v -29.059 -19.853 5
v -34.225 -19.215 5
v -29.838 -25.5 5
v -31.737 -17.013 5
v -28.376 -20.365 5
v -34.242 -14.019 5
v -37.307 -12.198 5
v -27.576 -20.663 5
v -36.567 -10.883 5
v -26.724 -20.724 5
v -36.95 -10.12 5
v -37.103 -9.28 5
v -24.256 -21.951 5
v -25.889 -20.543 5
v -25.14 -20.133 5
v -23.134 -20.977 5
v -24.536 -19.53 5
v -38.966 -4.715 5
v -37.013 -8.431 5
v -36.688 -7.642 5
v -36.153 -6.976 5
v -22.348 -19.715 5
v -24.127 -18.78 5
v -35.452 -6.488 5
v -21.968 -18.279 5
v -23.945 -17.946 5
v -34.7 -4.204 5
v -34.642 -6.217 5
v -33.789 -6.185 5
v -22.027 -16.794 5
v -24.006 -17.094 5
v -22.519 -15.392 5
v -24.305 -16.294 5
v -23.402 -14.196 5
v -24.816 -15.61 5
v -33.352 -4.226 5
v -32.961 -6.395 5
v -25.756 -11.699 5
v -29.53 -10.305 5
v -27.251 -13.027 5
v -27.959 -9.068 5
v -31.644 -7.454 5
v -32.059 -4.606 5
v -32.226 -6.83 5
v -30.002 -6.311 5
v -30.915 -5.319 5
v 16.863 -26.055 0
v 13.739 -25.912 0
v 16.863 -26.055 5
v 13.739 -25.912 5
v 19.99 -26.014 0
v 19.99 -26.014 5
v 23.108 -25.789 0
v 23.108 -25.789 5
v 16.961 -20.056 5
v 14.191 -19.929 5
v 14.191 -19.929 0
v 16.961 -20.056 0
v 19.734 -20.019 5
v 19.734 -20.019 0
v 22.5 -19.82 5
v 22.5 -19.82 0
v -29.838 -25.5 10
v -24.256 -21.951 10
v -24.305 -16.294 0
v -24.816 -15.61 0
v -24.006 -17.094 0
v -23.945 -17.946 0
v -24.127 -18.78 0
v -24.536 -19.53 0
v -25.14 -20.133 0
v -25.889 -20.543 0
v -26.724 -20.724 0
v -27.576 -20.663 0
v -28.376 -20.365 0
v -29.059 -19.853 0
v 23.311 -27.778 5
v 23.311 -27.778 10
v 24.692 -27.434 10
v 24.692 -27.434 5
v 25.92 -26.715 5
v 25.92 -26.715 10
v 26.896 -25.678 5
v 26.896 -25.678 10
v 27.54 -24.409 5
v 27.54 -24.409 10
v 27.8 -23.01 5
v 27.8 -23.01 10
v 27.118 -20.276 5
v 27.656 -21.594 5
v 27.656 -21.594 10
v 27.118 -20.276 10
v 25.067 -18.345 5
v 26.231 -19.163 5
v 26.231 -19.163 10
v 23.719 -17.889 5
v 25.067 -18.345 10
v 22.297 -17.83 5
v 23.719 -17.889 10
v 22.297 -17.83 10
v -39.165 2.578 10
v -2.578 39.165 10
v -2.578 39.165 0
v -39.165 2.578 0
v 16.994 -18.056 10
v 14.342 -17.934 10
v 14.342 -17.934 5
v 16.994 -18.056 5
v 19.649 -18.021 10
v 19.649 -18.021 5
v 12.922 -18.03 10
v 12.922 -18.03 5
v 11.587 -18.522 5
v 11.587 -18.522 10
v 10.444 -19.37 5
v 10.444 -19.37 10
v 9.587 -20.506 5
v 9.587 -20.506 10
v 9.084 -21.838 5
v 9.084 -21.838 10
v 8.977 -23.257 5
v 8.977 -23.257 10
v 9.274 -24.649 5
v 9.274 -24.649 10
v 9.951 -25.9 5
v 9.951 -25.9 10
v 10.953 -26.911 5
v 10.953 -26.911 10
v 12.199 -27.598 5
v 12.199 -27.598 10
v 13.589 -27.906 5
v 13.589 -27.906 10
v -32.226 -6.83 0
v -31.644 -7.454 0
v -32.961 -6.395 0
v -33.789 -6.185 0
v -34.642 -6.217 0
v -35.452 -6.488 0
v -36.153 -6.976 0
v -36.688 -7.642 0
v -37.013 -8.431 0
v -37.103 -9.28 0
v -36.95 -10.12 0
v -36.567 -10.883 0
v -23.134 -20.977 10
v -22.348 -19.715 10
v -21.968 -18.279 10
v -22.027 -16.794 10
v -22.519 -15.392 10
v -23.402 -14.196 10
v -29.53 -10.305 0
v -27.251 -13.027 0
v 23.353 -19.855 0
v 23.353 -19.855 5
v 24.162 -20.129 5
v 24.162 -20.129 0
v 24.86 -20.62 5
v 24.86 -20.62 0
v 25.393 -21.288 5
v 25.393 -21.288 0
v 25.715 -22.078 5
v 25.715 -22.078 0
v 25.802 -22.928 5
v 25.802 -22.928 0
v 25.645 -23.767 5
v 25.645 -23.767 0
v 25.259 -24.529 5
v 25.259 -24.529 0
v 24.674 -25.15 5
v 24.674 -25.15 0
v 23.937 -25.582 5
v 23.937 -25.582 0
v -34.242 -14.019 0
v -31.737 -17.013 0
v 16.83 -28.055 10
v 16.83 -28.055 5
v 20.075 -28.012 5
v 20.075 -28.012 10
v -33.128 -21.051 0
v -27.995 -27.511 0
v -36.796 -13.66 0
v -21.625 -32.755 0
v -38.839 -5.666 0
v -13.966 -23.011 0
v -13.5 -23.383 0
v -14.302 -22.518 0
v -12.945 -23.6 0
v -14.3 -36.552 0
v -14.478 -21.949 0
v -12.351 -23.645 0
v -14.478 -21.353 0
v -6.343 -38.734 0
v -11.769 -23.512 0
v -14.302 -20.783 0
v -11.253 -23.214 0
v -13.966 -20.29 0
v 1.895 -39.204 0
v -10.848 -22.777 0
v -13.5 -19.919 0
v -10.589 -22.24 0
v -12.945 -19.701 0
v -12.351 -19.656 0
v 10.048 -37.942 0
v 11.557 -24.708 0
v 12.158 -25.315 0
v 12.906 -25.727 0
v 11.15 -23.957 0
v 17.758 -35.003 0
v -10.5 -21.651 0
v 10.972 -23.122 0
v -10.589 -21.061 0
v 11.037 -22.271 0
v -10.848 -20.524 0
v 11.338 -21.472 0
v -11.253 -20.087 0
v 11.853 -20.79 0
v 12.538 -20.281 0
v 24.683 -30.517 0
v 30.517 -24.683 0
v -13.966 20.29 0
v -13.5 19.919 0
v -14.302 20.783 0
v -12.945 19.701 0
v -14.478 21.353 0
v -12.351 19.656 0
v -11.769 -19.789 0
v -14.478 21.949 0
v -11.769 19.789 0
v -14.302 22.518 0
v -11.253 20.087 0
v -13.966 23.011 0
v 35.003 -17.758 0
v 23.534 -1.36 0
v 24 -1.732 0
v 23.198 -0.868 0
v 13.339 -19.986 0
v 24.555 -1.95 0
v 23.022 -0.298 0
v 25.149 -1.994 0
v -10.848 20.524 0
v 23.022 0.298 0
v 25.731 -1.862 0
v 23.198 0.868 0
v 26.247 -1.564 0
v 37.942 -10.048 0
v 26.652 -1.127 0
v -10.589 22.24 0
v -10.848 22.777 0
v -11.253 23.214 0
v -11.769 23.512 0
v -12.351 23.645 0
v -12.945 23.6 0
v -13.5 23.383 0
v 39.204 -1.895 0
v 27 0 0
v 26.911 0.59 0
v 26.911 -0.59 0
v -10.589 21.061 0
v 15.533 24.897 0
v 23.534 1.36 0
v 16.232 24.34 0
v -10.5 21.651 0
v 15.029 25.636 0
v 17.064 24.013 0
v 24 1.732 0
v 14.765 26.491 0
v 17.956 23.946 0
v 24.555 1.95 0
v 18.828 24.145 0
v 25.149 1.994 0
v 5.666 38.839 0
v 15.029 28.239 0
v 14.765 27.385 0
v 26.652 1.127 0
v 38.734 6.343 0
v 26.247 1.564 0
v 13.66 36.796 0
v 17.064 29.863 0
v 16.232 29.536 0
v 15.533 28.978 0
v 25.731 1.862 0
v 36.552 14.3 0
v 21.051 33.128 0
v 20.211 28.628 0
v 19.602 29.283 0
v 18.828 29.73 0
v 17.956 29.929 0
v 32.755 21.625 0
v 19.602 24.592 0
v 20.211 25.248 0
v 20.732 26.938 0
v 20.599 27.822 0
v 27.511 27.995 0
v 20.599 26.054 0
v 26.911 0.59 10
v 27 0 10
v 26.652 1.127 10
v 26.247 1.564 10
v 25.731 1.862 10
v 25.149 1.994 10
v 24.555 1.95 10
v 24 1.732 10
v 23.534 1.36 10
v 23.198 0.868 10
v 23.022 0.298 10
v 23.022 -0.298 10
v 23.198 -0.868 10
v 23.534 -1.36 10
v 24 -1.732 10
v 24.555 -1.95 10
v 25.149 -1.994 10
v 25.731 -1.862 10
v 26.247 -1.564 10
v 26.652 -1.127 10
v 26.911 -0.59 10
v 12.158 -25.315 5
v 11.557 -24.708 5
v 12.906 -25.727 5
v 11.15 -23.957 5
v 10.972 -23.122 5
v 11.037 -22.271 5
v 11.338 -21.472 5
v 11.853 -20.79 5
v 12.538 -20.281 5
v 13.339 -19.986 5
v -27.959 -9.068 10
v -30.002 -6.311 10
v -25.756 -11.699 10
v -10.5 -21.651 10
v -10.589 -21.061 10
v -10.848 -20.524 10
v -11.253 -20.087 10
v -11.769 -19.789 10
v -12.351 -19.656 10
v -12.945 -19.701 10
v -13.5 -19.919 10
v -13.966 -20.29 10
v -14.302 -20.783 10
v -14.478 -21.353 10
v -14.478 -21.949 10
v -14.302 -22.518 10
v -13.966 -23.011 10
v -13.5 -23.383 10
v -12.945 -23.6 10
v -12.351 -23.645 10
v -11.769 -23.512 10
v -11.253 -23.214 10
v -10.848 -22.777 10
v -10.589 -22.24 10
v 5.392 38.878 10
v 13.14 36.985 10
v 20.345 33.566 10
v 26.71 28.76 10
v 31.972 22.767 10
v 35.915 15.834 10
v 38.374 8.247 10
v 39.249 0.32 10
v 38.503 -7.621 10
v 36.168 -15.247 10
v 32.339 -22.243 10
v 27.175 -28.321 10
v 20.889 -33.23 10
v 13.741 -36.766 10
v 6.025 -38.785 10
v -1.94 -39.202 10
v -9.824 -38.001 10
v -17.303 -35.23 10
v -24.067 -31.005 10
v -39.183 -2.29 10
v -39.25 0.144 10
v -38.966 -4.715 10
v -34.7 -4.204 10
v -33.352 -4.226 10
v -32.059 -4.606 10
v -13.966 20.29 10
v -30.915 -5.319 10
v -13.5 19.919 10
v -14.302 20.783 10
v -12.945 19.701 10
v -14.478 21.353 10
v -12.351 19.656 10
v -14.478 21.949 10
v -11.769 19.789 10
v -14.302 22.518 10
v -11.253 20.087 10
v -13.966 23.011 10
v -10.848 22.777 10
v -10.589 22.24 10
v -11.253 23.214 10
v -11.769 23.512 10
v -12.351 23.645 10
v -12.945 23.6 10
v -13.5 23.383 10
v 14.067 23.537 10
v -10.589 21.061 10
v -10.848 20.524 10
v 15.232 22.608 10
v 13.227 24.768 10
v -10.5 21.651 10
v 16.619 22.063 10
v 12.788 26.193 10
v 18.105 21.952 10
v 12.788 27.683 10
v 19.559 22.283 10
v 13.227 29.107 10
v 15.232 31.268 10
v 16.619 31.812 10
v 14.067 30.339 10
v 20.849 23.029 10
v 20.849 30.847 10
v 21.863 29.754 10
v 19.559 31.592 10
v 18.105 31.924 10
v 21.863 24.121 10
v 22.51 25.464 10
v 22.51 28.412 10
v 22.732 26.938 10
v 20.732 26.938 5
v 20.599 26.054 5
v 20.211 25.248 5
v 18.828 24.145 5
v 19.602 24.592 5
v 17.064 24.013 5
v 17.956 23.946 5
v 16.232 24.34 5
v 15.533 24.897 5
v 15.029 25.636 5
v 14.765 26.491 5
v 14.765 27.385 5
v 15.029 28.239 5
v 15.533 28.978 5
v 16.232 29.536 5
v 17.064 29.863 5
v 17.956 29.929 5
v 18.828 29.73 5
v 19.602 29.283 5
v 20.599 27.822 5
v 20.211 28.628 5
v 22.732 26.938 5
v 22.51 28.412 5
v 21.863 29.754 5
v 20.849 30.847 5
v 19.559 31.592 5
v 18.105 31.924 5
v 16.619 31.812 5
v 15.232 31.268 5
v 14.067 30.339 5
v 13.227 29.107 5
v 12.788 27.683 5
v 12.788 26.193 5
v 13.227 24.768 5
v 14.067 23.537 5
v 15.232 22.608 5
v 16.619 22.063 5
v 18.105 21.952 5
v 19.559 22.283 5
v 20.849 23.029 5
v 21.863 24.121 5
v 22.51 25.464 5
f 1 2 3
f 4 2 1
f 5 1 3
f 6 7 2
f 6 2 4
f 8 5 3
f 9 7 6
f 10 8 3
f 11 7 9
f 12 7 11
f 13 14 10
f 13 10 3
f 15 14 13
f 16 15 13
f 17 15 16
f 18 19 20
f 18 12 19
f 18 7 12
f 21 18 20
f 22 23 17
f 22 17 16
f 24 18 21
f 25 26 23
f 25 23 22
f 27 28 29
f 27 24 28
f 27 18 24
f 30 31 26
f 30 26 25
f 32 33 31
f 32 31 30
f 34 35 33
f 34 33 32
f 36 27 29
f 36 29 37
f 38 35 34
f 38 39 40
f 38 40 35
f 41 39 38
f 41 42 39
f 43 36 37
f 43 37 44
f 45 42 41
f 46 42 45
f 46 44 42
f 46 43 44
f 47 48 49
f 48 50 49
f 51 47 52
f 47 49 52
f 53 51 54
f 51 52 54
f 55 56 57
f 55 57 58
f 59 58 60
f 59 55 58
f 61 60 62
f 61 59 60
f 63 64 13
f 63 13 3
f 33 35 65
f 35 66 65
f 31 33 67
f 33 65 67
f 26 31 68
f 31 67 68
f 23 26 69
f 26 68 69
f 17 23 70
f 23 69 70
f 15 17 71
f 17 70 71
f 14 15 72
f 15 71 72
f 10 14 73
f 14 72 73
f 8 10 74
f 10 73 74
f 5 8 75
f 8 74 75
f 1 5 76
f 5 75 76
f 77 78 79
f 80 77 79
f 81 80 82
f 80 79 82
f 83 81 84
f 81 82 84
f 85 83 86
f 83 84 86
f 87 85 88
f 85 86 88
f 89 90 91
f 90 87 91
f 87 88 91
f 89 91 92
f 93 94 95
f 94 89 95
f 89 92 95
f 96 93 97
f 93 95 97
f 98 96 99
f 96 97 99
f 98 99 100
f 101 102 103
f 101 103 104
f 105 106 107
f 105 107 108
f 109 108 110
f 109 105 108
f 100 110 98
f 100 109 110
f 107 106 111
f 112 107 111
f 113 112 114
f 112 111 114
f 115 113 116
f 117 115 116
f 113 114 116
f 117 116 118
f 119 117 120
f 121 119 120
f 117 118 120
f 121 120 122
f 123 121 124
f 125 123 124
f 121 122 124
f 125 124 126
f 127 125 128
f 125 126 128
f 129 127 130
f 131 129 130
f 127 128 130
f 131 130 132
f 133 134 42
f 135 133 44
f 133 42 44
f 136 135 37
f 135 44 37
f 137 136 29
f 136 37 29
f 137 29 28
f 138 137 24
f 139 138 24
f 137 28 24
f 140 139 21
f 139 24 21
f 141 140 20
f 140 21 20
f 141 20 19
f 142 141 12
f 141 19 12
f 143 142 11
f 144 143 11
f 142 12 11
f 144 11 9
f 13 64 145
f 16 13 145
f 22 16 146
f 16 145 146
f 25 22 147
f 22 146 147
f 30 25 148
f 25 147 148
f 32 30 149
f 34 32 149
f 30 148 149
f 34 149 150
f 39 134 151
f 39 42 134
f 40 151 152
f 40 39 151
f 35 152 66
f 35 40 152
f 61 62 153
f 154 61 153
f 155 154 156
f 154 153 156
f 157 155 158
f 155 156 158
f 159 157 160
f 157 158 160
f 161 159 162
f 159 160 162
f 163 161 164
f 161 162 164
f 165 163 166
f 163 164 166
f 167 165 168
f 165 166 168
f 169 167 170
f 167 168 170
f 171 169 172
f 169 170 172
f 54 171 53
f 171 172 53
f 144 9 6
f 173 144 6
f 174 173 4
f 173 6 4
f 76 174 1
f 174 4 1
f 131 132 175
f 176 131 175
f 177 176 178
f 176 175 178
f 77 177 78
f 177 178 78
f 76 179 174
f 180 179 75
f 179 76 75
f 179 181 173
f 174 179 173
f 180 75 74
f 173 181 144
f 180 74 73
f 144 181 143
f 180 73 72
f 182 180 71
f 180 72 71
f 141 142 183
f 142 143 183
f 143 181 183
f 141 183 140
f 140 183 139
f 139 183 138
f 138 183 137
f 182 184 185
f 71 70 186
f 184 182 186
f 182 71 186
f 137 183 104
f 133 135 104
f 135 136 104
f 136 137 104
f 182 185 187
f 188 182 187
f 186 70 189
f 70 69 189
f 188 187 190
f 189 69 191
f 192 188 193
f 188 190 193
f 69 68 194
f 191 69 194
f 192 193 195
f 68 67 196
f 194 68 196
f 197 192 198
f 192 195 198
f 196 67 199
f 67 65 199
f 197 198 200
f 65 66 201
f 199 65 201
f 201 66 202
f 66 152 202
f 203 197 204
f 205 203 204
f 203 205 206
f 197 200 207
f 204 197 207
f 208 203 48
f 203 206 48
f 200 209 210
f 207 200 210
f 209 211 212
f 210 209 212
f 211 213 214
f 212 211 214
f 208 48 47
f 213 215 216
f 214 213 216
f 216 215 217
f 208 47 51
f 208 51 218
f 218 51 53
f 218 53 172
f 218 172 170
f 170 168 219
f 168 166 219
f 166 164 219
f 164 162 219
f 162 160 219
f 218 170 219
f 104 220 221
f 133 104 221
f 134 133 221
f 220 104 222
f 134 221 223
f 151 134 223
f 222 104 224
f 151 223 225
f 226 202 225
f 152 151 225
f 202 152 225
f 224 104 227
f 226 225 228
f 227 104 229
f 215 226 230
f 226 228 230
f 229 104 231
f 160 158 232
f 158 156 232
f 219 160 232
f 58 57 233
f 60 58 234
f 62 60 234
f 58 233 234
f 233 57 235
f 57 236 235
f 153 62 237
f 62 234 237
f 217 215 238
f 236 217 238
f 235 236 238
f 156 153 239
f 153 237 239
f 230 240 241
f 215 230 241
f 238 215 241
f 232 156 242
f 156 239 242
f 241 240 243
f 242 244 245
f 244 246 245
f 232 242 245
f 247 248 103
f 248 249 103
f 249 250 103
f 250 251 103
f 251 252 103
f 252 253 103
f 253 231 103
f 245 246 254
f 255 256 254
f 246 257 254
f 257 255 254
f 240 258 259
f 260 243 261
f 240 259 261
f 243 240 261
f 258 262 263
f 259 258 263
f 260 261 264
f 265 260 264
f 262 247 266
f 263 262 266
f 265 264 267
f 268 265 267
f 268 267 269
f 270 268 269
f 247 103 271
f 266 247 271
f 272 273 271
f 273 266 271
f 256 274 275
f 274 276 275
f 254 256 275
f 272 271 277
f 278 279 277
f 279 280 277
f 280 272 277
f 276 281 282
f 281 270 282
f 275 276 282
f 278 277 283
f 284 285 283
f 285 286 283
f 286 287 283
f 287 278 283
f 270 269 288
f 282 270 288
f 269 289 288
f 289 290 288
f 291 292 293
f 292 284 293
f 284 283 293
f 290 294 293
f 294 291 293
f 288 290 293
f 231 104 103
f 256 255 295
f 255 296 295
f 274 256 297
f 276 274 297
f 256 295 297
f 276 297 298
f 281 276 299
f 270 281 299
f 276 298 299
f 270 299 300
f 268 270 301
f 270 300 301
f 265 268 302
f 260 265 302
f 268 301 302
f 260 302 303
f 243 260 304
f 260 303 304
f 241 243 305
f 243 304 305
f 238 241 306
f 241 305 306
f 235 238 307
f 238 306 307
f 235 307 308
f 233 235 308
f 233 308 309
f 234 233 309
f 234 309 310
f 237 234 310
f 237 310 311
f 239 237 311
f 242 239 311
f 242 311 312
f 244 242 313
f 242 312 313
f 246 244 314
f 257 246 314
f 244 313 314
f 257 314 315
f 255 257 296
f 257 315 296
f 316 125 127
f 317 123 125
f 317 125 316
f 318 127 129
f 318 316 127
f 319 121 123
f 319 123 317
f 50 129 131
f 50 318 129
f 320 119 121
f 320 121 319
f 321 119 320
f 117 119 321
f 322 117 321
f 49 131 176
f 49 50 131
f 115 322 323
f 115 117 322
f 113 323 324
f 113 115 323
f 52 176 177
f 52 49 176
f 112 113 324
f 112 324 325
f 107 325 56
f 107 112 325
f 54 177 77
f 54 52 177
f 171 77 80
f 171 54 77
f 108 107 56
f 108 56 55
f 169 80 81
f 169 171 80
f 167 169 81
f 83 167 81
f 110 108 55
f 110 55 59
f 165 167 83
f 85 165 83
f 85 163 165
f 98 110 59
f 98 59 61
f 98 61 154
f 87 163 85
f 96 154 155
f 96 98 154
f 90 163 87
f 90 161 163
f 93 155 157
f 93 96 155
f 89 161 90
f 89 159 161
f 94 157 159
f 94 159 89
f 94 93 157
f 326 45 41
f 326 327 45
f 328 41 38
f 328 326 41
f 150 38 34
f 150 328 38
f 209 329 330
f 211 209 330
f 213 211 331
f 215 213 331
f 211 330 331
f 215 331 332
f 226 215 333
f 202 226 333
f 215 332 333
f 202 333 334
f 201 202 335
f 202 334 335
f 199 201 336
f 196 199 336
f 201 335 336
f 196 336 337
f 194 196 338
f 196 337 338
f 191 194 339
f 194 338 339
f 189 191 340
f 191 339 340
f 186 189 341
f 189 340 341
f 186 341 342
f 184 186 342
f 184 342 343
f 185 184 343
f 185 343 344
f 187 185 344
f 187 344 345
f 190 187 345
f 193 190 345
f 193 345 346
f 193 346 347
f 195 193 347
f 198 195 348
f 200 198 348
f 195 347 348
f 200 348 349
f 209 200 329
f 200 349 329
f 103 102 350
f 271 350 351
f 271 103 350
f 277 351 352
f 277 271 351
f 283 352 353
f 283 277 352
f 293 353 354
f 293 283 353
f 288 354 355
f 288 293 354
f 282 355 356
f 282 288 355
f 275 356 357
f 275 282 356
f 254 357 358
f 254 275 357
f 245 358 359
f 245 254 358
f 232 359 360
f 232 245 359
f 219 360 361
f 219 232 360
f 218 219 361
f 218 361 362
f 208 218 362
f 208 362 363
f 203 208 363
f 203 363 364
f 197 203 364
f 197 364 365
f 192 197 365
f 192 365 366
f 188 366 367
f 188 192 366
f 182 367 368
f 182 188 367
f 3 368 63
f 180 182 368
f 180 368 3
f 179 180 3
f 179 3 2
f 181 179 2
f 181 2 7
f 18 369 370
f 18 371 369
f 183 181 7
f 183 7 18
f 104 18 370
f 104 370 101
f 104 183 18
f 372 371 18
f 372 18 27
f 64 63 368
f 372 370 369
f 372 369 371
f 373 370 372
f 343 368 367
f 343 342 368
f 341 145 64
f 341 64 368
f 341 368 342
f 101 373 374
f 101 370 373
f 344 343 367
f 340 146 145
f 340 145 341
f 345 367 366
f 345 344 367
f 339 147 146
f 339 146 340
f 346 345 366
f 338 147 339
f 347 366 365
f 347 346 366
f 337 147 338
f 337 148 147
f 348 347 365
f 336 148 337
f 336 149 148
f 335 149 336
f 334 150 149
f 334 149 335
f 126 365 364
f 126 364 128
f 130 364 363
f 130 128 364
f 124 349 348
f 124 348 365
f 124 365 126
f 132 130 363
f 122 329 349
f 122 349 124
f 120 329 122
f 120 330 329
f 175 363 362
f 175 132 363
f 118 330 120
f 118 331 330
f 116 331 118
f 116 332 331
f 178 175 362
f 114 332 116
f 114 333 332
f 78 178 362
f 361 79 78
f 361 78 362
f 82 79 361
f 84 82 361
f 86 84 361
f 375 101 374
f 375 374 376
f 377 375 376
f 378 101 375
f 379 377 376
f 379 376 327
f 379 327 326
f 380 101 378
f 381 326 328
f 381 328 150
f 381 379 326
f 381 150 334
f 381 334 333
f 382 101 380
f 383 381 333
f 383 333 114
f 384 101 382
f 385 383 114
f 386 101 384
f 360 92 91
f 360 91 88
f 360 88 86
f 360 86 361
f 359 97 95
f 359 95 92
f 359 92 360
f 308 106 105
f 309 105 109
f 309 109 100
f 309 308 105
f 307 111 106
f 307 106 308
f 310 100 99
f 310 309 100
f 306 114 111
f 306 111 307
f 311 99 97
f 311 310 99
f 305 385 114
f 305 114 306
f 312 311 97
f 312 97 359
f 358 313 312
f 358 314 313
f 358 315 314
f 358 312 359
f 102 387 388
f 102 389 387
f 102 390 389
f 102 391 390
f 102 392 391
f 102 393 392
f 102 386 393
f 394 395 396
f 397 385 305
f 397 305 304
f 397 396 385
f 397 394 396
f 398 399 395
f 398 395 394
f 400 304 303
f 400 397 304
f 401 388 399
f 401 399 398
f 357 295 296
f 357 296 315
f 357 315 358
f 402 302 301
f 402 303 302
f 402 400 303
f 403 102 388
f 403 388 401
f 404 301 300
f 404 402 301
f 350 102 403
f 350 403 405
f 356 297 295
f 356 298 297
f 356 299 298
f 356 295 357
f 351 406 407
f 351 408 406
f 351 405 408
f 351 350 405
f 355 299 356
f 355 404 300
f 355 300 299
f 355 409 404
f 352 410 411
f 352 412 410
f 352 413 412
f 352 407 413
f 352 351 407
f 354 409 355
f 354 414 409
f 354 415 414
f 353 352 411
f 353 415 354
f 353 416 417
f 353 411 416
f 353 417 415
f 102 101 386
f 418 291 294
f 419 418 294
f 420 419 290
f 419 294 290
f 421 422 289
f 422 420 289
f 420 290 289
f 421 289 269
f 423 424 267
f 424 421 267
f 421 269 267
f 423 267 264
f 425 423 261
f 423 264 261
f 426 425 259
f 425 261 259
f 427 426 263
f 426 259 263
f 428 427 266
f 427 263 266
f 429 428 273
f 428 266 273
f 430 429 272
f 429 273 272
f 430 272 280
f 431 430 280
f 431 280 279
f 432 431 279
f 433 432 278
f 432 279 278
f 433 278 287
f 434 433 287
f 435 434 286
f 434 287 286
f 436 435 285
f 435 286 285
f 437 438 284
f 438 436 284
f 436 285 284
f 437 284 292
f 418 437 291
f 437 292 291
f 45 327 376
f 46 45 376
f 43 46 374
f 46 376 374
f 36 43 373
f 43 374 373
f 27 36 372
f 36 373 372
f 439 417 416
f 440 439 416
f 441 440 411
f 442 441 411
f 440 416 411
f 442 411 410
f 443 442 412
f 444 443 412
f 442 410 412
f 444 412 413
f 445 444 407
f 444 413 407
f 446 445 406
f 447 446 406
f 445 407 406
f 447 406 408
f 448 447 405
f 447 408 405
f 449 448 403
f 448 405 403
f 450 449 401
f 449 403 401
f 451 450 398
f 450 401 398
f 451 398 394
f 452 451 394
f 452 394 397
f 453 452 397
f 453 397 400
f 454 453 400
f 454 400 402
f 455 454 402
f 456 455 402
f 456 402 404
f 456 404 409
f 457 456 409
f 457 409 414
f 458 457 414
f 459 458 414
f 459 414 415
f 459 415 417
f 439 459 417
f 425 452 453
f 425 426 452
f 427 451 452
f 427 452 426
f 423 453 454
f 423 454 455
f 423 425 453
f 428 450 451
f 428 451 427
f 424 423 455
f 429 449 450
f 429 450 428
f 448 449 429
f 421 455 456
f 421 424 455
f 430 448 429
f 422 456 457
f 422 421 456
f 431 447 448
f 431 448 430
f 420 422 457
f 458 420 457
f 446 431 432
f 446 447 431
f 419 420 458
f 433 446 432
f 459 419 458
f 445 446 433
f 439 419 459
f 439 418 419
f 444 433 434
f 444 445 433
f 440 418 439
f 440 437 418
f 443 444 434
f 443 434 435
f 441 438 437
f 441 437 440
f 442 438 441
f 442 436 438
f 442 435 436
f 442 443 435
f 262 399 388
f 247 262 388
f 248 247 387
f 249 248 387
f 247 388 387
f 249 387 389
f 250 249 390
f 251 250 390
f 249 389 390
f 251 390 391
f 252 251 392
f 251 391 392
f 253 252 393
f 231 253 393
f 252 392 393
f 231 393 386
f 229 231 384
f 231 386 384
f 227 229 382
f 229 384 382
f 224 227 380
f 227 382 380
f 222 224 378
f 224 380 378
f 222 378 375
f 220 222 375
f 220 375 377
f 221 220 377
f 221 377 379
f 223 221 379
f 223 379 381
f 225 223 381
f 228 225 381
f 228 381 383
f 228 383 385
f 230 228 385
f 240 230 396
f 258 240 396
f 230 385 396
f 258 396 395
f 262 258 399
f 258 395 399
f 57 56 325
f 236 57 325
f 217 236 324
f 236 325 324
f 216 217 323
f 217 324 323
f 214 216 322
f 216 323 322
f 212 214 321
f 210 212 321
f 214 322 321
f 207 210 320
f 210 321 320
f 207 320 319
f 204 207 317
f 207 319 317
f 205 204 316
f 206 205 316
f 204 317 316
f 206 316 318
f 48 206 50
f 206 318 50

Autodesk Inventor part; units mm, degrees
ref_plane "YZ Plane" through (0, 0, 0) normal (1, 0, 0) x (0, 1, 0)
ref_plane "XZ Plane" through (0, 0, 0) normal (0, 1, 0) x (-1, 0, 0)
ref_plane "XY Plane" through (0, 0, 0) normal (0, 0, 1) x (1, 0, 0)
sketch "Sketch1" plane through (0, 0, 0) normal (0, 0, 1) x (1, 0, 0)
  arc A0 (-39.1074, 3.3431) -> (-3.3431, 39.1074) centre (0, 0) ccw
  line L0 (0, 0) -> (30.017, 0) construction
  line L1 (-39.1074, 3.3431) -> (-3.3431, 39.1074)
  line L2 (0, 0) -> (39.25, 0) construction
  circle A1 centre (22.8042, -22.8042) radius 3
  circle A2 centre (-26.9378, -17.7318) radius 3
  circle A3 centre (17.7318, 26.9378) radius 3
  dimension "d0" = 78.5
  dimension "d6" = 6
  dimension "d9" = 6
  dimension "d10" = 6
extrude "Extrusion1" add sketch "Sketch1" along normal blind 10
sketch "Sketch2" plane through (0, 0, 10) normal (0, 0, 1) x (1, 0, 0)
  circle A0 centre (17.7318, 26.9378) radius 3 projected
  circle A1 centre (17.7318, 26.9378) radius 5
  circle A2 centre (22.8042, -22.8042) radius 3 projected
  circle A3 centre (22.8042, -22.8042) radius 5
  circle A4 centre (-26.9378, -17.7318) radius 3 projected
  circle A5 centre (-26.9378, -17.7318) radius 5
  point P0 (0, 0)
  dimension "d13" = 10
  dimension "d14" = 10
  dimension "d15" = 10
extrude "Extrusion2" cut sketch "Sketch2" against normal blind 5 contours A1
extrude "Extrusion3" cut sketch "Sketch2" against normal blind 5 contours A5
extrude "Extrusion4" cut sketch "Sketch2" against normal blind 5 contours A3
sketch "Sketch3" plane through (0, 0, 10) normal (0, 0, 1) x (1, 0, 0)
  line L0 (0, 0) -> (25, 0) construction
  circle A0 centre (-12.5, -21.6506) radius 2
  arc A1 (-39.1074, 3.3431) -> (-3.3431, 39.1074) centre (0, 0) ccw projected
  circle A2 centre (25, 0) radius 2
  circle A3 centre (-12.5, 21.6506) radius 2
  dimension "d24" = 4
  dimension "d27" = 360
extrude "Extrusion5" cut sketch "Sketch3" against normal through all contours A0
extrude "Extrusion6" cut sketch "Sketch3" against normal through all contours A2
extrude "Extrusion7" cut sketch "Sketch3" against normal through all contours A3
sketch "Sketch5" plane through (0, 0, 10) normal (0, 0, 1) x (1, 0, 0)
  circle A0 centre (17.7318, 26.9378) radius 3 projected
  circle A1 centre (22.8042, -22.8042) radius 3 projected
  circle A2 centre (-26.9378, -17.7318) radius 5 projected
  arc A3 (-39.1074, 3.3431) -> (-3.3431, 39.1074) centre (0, 0) ccw projected
  arc A4 (-30.0025, -6.3107) -> (-23.4023, -14.1962) centre (17.7318, 26.9378) ccw
  line L0 (-38.9658, -4.7151) -> (-34.7002, -4.204)
  line L1 (-24.2556, -21.9514) -> (-29.8381, -25.5)
  circle A5 centre (-26.9378, -17.7318) radius 5 projected
  arc A6 (-30.0025, -6.3107) -> (-34.7002, -4.204) centre (-34.1053, -9.1685) ccw
  arc A7 (12.2473, -17.7267) -> (22.2969, -17.83) centre (17.7318, 26.9378) ccw
  arc A8 (11.0285, -27.6521) -> (23.3114, -27.7784) centre (17.7318, 26.9378) ccw
  circle A9 centre (22.8042, -22.8042) radius 5 projected
extrude "Extrusion11" cut sketch "Sketch5" against normal blind 5 contours A2 L1 A3 L0 A6 A4
sketch "Sketch6" plane through (0, 0, 5) normal (0, 0, 1) x (1, 0, 0)
  circle A0 centre (17.7318, 26.9378) radius 3 projected
  circle A1 centre (22.8042, -22.8042) radius 3 projected
  circle A2 centre (-26.9378, -17.7318) radius 3 projected
  arc A3 (12.0035, -19.7118) -> (22.4998, -19.8197) centre (17.7318, 26.9378) ccw
  arc A4 (11.2723, -25.6671) -> (23.1085, -25.7887) centre (17.7318, 26.9378) ccw
  arc A5 (12.2473, -17.7267) -> (11.0285, -27.6521) centre (11.6379, -22.6894) ccw projected
  arc A6 (12.0035, -19.7118) -> (11.2723, -25.6671) centre (11.6379, -22.6894) ccw
  arc A7 (-31.6436, -7.4538) -> (-24.8165, -15.6104) centre (17.7318, 26.9378) ccw
  arc A8 (-36.567, -10.8831) -> (-29.0592, -19.8531) centre (17.7318, 26.9378) ccw
  arc A9 (-30.0025, -6.3107) -> (-34.7002, -4.204) centre (-34.1053, -9.1685) ccw projected
  arc A10 (-31.6436, -7.4538) -> (-36.567, -10.8831) centre (-34.1053, -9.1685) ccw
  point P0 (0, 0)
  dimension "d69" = 106
  dimension "d70" = 6
  dimension "d71" = 6
extrude "Extrusion14" cut sketch "Sketch6" against normal blind 5 contours A2 | A2 A8 A10 A7
sketch "Sketch7" plane through (0, 0, 10) normal (0, 0, 1) x (1, 0, 0)
  line L0 (-3.3431, 39.1074) -> (-39.1074, 3.3431) projected
  arc A0 (-29.8381, -25.5) -> (-3.3431, 39.1074) centre (0, 0) ccw projected
  line L1 (-2.5781, 39.1652) -> (-39.1652, 2.5781)
  line L2 (-2.5781, 39.1652) -> (49.1639, 39.1652) construction
  arc A1 (-39.1074, 3.3431) -> (-38.9658, -4.7151) centre (0, 0) ccw projected
  dimension "d77" = 135
extrude "Extrusion15" cut sketch "Sketch7" against normal blind 10
sketch "Sketch8" plane through (0, 0, 10) normal (0, 0, 1) x (1, 0, 0)
  circle A0 centre (17.7318, 26.9378) radius 3 projected
  line L0 (17.7318, 26.9378) -> (67.7318, 26.9378) construction
  circle A1 centre (22.8042, -22.8042) radius 3 projected
  arc A2 (14.342, -17.9343) -> (13.5888, -27.9059) centre (13.9654, -22.9201) ccw
  arc A3 (14.342, -17.9343) -> (22.2969, -17.83) centre (17.7318, 26.9378) ccw
  arc A4 (13.5888, -27.9059) -> (23.3114, -27.7784) centre (17.7318, 26.9378) ccw
  circle A5 centre (22.8042, -22.8042) radius 5 projected
  point P0 (0, 0)
  dimension "d84" = 10
  dimension "d87" = 10
extrude "Extrusion16" cut sketch "Sketch8" against normal blind 5 contours A3 A5 A4 A2 | A5
sketch "Sketch9" plane through (0, 0, 5) normal (0, 0, 1) x (1, 0, 0)
  arc A0 (14.342, -17.9343) -> (13.5888, -27.9059) centre (13.9654, -22.9201) ccw projected
  arc A1 (14.1914, -19.9286) -> (13.7394, -25.9116) centre (13.9654, -22.9201) ccw
  circle A2 centre (17.7318, 26.9378) radius 3 projected
  circle A3 centre (22.8042, -22.8042) radius 3 projected
  arc A4 (14.1914, -19.9286) -> (22.4998, -19.8197) centre (17.7318, 26.9378) ccw
  arc A5 (13.7394, -25.9116) -> (23.1085, -25.7887) centre (17.7318, 26.9378) ccw
  point P0 (0, 0)
  dimension "d90" = 6
  dimension "d92" = 6
extrude "Extrusion17" cut sketch "Sketch9" against normal blind 5 contours A4 A3 A5 A1
thread "Thread1" size "M4x0.7" class "6H" standard "ANSI Metric M Profile" full length
thread "Thread2" size "M4x0.7" class "6H" standard "ANSI Metric M Profile" full length
thread "Thread3" size "M4x0.7" class "6H" standard "ANSI Metric M Profile" full length
properties part number "Encoder Mount Base" material "ABS Plastic"
